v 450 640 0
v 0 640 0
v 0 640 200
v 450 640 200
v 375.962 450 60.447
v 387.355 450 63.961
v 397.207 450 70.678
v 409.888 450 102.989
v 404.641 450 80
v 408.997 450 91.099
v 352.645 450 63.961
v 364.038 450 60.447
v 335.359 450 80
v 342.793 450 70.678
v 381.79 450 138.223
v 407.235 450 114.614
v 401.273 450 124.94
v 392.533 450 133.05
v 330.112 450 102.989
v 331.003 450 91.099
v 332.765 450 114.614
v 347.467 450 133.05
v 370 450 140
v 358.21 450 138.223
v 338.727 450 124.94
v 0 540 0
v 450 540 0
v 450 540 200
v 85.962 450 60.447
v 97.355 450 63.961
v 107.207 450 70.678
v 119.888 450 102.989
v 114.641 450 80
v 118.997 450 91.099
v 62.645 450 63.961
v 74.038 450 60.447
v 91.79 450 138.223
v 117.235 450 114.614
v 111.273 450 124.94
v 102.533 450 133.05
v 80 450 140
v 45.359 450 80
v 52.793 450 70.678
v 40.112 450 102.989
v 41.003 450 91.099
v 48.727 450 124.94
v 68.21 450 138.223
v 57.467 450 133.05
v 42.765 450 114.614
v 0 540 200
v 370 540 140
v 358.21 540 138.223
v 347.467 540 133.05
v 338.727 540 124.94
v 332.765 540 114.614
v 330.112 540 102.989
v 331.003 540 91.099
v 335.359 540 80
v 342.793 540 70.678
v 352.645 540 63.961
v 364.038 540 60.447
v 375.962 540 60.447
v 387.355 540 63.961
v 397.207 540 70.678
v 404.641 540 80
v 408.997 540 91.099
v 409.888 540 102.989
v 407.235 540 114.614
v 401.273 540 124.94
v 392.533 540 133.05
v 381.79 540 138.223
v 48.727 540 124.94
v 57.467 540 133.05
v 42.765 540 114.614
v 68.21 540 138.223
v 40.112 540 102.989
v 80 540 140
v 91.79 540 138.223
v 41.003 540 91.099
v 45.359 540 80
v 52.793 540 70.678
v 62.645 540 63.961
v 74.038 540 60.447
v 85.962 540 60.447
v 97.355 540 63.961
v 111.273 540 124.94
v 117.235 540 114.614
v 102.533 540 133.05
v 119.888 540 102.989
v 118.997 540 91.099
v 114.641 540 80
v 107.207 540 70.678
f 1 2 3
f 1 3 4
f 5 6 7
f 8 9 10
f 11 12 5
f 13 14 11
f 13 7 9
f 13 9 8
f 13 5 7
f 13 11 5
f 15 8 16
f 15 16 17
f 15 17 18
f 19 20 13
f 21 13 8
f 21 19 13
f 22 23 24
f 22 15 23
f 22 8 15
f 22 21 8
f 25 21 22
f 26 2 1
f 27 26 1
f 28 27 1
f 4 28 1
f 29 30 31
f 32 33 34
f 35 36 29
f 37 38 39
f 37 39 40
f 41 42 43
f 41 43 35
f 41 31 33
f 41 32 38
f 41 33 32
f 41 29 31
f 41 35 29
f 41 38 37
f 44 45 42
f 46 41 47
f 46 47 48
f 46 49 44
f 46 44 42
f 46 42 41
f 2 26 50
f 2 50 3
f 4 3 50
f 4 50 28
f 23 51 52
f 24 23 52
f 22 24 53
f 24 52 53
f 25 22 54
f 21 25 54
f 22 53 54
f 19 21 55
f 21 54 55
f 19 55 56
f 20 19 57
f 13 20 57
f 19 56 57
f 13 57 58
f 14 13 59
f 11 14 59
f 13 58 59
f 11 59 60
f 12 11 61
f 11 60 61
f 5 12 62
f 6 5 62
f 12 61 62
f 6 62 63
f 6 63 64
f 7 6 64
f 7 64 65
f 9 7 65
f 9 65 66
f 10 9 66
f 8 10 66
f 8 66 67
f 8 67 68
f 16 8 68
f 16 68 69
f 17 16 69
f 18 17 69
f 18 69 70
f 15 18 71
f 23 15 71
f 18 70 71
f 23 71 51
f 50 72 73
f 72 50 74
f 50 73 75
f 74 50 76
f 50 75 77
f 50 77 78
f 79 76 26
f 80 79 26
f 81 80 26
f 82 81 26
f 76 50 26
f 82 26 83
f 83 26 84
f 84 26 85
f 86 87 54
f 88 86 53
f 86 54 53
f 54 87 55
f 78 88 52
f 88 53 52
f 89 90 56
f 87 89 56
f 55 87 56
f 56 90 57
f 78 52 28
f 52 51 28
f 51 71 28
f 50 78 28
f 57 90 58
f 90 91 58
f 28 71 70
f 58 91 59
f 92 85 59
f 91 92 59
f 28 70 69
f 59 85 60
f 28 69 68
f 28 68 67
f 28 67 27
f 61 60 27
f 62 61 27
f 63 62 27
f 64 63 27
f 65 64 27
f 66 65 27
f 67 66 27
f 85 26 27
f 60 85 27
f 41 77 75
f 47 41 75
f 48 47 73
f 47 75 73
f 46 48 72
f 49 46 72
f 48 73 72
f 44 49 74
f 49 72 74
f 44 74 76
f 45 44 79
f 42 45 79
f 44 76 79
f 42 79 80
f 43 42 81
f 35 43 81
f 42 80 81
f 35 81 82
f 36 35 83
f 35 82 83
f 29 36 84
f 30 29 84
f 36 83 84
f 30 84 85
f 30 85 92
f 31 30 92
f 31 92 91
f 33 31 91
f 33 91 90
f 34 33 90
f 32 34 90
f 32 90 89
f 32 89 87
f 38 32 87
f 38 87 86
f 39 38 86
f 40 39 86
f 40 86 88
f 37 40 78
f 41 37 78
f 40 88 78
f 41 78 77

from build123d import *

# Parameters (mm, degrees)
SKETCH1_W           = 450
SKETCH1_H           = 100
BOSS_EXTRUDE1_DEPTH = 200
SKETCH2_R           = 40
BOSS_EXTRUDE2_DEPTH = 90


with BuildPart() as part:
    # Sketch1 → Boss-Extrude1 (new body)
    with BuildSketch(Plane.XY):
        with Locations((225, 590)):
            Rectangle(SKETCH1_W, SKETCH1_H)
    extrude(amount=BOSS_EXTRUDE1_DEPTH)

    # Sketch2 → Boss-Extrude2 (add)
    with BuildSketch(Plane.XZ.offset(-540)):
        with Locations(Location((80, 100, 0), (0, 0, 90))):
            Circle(SKETCH2_R)
        with Locations(Location((370, 100, 0), (0, 0, 90))):
            Circle(SKETCH2_R)
    extrude(amount=BOSS_EXTRUDE2_DEPTH)


solid = part.part
